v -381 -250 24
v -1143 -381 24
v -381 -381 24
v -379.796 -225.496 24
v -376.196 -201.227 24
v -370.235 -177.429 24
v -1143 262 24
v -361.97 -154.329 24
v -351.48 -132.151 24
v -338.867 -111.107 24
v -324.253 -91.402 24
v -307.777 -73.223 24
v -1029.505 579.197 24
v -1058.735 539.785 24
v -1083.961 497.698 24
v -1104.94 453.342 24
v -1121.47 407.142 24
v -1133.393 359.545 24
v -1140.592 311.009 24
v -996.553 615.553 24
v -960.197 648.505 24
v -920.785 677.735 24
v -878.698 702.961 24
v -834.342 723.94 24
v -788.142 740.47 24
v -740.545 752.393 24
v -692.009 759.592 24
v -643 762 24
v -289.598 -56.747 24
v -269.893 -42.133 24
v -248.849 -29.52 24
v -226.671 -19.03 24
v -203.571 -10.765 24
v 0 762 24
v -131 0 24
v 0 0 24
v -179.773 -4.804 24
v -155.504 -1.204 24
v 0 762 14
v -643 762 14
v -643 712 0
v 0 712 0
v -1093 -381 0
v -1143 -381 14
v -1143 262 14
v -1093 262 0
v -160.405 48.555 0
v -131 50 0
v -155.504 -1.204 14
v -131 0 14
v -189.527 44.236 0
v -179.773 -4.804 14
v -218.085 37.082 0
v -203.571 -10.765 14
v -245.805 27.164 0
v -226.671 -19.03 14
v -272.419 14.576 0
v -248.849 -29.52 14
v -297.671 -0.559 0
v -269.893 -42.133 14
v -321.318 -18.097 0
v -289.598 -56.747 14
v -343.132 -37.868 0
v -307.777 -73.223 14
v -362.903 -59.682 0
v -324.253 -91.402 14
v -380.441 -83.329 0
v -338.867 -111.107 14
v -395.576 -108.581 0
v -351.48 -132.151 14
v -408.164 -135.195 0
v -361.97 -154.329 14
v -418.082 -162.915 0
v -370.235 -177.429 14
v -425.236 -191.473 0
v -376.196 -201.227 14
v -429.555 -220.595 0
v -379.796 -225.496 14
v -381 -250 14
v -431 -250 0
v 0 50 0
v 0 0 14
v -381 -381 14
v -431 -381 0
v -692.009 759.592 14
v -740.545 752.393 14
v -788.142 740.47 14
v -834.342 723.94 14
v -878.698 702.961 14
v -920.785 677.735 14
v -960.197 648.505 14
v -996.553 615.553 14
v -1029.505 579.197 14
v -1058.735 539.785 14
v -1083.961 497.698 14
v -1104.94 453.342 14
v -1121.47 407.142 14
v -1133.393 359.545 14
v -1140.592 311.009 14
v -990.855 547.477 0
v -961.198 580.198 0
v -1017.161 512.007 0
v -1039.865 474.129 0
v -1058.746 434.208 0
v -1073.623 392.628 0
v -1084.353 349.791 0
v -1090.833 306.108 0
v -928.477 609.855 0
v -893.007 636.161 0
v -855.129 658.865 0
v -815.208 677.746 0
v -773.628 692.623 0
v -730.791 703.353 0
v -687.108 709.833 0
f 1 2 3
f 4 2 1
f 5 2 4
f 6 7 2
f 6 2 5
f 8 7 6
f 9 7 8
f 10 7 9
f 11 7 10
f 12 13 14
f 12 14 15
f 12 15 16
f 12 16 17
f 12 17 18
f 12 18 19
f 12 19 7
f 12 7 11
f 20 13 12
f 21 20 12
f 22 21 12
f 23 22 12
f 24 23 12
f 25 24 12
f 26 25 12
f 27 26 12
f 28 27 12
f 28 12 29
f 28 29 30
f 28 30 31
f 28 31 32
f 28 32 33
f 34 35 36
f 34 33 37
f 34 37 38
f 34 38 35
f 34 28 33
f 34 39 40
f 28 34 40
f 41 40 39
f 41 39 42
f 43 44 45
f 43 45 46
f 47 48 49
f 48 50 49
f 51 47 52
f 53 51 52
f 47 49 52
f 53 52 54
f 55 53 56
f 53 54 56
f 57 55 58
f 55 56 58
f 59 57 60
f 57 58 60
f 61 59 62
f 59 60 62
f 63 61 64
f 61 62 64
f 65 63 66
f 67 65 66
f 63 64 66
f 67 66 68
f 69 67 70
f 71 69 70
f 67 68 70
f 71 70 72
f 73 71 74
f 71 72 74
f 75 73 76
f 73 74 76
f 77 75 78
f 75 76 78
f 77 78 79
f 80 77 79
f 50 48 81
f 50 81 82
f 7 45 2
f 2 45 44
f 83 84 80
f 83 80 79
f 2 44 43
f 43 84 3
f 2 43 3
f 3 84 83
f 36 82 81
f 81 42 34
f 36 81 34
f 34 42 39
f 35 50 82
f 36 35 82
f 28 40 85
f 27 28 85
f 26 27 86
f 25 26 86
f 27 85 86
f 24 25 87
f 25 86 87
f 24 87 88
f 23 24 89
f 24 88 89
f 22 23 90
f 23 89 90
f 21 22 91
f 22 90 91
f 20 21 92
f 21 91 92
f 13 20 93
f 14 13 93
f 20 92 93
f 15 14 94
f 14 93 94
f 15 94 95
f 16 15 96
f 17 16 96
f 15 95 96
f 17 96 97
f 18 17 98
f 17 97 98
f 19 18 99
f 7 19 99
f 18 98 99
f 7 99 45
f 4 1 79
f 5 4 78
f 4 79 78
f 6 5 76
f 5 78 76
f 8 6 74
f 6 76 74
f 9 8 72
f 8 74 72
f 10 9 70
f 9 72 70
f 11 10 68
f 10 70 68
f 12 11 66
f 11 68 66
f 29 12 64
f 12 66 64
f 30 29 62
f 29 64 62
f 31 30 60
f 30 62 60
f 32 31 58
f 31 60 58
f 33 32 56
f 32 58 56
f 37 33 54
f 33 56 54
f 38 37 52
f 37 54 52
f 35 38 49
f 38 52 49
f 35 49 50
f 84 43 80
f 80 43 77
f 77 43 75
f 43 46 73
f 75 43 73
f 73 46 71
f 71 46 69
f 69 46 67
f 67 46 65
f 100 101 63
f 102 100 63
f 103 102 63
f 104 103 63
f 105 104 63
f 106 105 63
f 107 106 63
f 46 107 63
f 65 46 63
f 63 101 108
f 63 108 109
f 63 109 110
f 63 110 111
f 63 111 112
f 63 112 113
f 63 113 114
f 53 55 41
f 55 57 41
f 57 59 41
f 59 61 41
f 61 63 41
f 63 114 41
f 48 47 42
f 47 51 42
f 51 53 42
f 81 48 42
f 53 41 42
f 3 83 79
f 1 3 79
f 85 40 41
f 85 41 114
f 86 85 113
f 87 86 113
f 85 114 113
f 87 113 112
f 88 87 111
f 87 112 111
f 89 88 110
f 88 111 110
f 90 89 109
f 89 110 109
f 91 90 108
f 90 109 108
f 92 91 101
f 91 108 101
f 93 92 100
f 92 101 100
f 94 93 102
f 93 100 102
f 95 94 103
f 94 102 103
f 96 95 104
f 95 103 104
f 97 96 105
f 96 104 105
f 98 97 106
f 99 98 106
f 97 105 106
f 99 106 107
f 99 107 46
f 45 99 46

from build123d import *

# Parameters (mm, degrees)
F1_DEPTH = 24


with BuildPart() as f1:
    # F0 (on Top) → F1 (new body)
    with BuildSketch(Plane.XY):
        with BuildLine():
            Line((-131, 0), (0, 0))
            Line((0, 0), (0, 762))
            Line((0, 762), (-643, 762))
            ThreePointArc((-643, 762), (-996.553391, 615.553391), (-1143, 262))
            Line((-1143, 262), (-1143, -381))
            Line((-1143, -381), (-381, -381))
            Line((-381, -381), (-381, -250))
            ThreePointArc((-381, -250), (-307.776695, -73.223305), (-131, 0))
        make_face()
    extrude(amount=F1_DEPTH)

    # F4: sweep along a path in F3
    with BuildLine(Plane(origin=(0, 0, 0), x_dir=(1, 0, 0), z_dir=(0, 0, -1))) as f4_path:
        Line((0, 0), (-131, 0))
        ThreePointArc((-131, 0), (-307.776695, 73.223305), (-381, 250))
        Line((-381, 250), (-381, 381))
    # F2 (on face) → F4 (sweep, cut)
    with BuildSketch(Plane.YZ):
        Polygon((0, 0), (50, 0), (0, 14), align=None)
    sweep(path=f4_path.line, mode=Mode.SUBTRACT)

    # F5: sweep along a path in F3
    with BuildLine(Plane(origin=(0, 0, 0), x_dir=(1, 0, 0), z_dir=(0, 0, -1))) as f5_path:
        Line((0, -762), (-643, -762))
        ThreePointArc((-643, -762), (-996.553391, -615.553391), (-1143, -262))
        Line((-1143, -262), (-1143, 381))
    # F2 (on face) → F5 (sweep, cut)
    with BuildSketch(Plane.YZ):
        Polygon((762, 0), (762, 14), (712, 0), align=None)
    sweep(path=f5_path.line, mode=Mode.SUBTRACT)


solid = f1.part
